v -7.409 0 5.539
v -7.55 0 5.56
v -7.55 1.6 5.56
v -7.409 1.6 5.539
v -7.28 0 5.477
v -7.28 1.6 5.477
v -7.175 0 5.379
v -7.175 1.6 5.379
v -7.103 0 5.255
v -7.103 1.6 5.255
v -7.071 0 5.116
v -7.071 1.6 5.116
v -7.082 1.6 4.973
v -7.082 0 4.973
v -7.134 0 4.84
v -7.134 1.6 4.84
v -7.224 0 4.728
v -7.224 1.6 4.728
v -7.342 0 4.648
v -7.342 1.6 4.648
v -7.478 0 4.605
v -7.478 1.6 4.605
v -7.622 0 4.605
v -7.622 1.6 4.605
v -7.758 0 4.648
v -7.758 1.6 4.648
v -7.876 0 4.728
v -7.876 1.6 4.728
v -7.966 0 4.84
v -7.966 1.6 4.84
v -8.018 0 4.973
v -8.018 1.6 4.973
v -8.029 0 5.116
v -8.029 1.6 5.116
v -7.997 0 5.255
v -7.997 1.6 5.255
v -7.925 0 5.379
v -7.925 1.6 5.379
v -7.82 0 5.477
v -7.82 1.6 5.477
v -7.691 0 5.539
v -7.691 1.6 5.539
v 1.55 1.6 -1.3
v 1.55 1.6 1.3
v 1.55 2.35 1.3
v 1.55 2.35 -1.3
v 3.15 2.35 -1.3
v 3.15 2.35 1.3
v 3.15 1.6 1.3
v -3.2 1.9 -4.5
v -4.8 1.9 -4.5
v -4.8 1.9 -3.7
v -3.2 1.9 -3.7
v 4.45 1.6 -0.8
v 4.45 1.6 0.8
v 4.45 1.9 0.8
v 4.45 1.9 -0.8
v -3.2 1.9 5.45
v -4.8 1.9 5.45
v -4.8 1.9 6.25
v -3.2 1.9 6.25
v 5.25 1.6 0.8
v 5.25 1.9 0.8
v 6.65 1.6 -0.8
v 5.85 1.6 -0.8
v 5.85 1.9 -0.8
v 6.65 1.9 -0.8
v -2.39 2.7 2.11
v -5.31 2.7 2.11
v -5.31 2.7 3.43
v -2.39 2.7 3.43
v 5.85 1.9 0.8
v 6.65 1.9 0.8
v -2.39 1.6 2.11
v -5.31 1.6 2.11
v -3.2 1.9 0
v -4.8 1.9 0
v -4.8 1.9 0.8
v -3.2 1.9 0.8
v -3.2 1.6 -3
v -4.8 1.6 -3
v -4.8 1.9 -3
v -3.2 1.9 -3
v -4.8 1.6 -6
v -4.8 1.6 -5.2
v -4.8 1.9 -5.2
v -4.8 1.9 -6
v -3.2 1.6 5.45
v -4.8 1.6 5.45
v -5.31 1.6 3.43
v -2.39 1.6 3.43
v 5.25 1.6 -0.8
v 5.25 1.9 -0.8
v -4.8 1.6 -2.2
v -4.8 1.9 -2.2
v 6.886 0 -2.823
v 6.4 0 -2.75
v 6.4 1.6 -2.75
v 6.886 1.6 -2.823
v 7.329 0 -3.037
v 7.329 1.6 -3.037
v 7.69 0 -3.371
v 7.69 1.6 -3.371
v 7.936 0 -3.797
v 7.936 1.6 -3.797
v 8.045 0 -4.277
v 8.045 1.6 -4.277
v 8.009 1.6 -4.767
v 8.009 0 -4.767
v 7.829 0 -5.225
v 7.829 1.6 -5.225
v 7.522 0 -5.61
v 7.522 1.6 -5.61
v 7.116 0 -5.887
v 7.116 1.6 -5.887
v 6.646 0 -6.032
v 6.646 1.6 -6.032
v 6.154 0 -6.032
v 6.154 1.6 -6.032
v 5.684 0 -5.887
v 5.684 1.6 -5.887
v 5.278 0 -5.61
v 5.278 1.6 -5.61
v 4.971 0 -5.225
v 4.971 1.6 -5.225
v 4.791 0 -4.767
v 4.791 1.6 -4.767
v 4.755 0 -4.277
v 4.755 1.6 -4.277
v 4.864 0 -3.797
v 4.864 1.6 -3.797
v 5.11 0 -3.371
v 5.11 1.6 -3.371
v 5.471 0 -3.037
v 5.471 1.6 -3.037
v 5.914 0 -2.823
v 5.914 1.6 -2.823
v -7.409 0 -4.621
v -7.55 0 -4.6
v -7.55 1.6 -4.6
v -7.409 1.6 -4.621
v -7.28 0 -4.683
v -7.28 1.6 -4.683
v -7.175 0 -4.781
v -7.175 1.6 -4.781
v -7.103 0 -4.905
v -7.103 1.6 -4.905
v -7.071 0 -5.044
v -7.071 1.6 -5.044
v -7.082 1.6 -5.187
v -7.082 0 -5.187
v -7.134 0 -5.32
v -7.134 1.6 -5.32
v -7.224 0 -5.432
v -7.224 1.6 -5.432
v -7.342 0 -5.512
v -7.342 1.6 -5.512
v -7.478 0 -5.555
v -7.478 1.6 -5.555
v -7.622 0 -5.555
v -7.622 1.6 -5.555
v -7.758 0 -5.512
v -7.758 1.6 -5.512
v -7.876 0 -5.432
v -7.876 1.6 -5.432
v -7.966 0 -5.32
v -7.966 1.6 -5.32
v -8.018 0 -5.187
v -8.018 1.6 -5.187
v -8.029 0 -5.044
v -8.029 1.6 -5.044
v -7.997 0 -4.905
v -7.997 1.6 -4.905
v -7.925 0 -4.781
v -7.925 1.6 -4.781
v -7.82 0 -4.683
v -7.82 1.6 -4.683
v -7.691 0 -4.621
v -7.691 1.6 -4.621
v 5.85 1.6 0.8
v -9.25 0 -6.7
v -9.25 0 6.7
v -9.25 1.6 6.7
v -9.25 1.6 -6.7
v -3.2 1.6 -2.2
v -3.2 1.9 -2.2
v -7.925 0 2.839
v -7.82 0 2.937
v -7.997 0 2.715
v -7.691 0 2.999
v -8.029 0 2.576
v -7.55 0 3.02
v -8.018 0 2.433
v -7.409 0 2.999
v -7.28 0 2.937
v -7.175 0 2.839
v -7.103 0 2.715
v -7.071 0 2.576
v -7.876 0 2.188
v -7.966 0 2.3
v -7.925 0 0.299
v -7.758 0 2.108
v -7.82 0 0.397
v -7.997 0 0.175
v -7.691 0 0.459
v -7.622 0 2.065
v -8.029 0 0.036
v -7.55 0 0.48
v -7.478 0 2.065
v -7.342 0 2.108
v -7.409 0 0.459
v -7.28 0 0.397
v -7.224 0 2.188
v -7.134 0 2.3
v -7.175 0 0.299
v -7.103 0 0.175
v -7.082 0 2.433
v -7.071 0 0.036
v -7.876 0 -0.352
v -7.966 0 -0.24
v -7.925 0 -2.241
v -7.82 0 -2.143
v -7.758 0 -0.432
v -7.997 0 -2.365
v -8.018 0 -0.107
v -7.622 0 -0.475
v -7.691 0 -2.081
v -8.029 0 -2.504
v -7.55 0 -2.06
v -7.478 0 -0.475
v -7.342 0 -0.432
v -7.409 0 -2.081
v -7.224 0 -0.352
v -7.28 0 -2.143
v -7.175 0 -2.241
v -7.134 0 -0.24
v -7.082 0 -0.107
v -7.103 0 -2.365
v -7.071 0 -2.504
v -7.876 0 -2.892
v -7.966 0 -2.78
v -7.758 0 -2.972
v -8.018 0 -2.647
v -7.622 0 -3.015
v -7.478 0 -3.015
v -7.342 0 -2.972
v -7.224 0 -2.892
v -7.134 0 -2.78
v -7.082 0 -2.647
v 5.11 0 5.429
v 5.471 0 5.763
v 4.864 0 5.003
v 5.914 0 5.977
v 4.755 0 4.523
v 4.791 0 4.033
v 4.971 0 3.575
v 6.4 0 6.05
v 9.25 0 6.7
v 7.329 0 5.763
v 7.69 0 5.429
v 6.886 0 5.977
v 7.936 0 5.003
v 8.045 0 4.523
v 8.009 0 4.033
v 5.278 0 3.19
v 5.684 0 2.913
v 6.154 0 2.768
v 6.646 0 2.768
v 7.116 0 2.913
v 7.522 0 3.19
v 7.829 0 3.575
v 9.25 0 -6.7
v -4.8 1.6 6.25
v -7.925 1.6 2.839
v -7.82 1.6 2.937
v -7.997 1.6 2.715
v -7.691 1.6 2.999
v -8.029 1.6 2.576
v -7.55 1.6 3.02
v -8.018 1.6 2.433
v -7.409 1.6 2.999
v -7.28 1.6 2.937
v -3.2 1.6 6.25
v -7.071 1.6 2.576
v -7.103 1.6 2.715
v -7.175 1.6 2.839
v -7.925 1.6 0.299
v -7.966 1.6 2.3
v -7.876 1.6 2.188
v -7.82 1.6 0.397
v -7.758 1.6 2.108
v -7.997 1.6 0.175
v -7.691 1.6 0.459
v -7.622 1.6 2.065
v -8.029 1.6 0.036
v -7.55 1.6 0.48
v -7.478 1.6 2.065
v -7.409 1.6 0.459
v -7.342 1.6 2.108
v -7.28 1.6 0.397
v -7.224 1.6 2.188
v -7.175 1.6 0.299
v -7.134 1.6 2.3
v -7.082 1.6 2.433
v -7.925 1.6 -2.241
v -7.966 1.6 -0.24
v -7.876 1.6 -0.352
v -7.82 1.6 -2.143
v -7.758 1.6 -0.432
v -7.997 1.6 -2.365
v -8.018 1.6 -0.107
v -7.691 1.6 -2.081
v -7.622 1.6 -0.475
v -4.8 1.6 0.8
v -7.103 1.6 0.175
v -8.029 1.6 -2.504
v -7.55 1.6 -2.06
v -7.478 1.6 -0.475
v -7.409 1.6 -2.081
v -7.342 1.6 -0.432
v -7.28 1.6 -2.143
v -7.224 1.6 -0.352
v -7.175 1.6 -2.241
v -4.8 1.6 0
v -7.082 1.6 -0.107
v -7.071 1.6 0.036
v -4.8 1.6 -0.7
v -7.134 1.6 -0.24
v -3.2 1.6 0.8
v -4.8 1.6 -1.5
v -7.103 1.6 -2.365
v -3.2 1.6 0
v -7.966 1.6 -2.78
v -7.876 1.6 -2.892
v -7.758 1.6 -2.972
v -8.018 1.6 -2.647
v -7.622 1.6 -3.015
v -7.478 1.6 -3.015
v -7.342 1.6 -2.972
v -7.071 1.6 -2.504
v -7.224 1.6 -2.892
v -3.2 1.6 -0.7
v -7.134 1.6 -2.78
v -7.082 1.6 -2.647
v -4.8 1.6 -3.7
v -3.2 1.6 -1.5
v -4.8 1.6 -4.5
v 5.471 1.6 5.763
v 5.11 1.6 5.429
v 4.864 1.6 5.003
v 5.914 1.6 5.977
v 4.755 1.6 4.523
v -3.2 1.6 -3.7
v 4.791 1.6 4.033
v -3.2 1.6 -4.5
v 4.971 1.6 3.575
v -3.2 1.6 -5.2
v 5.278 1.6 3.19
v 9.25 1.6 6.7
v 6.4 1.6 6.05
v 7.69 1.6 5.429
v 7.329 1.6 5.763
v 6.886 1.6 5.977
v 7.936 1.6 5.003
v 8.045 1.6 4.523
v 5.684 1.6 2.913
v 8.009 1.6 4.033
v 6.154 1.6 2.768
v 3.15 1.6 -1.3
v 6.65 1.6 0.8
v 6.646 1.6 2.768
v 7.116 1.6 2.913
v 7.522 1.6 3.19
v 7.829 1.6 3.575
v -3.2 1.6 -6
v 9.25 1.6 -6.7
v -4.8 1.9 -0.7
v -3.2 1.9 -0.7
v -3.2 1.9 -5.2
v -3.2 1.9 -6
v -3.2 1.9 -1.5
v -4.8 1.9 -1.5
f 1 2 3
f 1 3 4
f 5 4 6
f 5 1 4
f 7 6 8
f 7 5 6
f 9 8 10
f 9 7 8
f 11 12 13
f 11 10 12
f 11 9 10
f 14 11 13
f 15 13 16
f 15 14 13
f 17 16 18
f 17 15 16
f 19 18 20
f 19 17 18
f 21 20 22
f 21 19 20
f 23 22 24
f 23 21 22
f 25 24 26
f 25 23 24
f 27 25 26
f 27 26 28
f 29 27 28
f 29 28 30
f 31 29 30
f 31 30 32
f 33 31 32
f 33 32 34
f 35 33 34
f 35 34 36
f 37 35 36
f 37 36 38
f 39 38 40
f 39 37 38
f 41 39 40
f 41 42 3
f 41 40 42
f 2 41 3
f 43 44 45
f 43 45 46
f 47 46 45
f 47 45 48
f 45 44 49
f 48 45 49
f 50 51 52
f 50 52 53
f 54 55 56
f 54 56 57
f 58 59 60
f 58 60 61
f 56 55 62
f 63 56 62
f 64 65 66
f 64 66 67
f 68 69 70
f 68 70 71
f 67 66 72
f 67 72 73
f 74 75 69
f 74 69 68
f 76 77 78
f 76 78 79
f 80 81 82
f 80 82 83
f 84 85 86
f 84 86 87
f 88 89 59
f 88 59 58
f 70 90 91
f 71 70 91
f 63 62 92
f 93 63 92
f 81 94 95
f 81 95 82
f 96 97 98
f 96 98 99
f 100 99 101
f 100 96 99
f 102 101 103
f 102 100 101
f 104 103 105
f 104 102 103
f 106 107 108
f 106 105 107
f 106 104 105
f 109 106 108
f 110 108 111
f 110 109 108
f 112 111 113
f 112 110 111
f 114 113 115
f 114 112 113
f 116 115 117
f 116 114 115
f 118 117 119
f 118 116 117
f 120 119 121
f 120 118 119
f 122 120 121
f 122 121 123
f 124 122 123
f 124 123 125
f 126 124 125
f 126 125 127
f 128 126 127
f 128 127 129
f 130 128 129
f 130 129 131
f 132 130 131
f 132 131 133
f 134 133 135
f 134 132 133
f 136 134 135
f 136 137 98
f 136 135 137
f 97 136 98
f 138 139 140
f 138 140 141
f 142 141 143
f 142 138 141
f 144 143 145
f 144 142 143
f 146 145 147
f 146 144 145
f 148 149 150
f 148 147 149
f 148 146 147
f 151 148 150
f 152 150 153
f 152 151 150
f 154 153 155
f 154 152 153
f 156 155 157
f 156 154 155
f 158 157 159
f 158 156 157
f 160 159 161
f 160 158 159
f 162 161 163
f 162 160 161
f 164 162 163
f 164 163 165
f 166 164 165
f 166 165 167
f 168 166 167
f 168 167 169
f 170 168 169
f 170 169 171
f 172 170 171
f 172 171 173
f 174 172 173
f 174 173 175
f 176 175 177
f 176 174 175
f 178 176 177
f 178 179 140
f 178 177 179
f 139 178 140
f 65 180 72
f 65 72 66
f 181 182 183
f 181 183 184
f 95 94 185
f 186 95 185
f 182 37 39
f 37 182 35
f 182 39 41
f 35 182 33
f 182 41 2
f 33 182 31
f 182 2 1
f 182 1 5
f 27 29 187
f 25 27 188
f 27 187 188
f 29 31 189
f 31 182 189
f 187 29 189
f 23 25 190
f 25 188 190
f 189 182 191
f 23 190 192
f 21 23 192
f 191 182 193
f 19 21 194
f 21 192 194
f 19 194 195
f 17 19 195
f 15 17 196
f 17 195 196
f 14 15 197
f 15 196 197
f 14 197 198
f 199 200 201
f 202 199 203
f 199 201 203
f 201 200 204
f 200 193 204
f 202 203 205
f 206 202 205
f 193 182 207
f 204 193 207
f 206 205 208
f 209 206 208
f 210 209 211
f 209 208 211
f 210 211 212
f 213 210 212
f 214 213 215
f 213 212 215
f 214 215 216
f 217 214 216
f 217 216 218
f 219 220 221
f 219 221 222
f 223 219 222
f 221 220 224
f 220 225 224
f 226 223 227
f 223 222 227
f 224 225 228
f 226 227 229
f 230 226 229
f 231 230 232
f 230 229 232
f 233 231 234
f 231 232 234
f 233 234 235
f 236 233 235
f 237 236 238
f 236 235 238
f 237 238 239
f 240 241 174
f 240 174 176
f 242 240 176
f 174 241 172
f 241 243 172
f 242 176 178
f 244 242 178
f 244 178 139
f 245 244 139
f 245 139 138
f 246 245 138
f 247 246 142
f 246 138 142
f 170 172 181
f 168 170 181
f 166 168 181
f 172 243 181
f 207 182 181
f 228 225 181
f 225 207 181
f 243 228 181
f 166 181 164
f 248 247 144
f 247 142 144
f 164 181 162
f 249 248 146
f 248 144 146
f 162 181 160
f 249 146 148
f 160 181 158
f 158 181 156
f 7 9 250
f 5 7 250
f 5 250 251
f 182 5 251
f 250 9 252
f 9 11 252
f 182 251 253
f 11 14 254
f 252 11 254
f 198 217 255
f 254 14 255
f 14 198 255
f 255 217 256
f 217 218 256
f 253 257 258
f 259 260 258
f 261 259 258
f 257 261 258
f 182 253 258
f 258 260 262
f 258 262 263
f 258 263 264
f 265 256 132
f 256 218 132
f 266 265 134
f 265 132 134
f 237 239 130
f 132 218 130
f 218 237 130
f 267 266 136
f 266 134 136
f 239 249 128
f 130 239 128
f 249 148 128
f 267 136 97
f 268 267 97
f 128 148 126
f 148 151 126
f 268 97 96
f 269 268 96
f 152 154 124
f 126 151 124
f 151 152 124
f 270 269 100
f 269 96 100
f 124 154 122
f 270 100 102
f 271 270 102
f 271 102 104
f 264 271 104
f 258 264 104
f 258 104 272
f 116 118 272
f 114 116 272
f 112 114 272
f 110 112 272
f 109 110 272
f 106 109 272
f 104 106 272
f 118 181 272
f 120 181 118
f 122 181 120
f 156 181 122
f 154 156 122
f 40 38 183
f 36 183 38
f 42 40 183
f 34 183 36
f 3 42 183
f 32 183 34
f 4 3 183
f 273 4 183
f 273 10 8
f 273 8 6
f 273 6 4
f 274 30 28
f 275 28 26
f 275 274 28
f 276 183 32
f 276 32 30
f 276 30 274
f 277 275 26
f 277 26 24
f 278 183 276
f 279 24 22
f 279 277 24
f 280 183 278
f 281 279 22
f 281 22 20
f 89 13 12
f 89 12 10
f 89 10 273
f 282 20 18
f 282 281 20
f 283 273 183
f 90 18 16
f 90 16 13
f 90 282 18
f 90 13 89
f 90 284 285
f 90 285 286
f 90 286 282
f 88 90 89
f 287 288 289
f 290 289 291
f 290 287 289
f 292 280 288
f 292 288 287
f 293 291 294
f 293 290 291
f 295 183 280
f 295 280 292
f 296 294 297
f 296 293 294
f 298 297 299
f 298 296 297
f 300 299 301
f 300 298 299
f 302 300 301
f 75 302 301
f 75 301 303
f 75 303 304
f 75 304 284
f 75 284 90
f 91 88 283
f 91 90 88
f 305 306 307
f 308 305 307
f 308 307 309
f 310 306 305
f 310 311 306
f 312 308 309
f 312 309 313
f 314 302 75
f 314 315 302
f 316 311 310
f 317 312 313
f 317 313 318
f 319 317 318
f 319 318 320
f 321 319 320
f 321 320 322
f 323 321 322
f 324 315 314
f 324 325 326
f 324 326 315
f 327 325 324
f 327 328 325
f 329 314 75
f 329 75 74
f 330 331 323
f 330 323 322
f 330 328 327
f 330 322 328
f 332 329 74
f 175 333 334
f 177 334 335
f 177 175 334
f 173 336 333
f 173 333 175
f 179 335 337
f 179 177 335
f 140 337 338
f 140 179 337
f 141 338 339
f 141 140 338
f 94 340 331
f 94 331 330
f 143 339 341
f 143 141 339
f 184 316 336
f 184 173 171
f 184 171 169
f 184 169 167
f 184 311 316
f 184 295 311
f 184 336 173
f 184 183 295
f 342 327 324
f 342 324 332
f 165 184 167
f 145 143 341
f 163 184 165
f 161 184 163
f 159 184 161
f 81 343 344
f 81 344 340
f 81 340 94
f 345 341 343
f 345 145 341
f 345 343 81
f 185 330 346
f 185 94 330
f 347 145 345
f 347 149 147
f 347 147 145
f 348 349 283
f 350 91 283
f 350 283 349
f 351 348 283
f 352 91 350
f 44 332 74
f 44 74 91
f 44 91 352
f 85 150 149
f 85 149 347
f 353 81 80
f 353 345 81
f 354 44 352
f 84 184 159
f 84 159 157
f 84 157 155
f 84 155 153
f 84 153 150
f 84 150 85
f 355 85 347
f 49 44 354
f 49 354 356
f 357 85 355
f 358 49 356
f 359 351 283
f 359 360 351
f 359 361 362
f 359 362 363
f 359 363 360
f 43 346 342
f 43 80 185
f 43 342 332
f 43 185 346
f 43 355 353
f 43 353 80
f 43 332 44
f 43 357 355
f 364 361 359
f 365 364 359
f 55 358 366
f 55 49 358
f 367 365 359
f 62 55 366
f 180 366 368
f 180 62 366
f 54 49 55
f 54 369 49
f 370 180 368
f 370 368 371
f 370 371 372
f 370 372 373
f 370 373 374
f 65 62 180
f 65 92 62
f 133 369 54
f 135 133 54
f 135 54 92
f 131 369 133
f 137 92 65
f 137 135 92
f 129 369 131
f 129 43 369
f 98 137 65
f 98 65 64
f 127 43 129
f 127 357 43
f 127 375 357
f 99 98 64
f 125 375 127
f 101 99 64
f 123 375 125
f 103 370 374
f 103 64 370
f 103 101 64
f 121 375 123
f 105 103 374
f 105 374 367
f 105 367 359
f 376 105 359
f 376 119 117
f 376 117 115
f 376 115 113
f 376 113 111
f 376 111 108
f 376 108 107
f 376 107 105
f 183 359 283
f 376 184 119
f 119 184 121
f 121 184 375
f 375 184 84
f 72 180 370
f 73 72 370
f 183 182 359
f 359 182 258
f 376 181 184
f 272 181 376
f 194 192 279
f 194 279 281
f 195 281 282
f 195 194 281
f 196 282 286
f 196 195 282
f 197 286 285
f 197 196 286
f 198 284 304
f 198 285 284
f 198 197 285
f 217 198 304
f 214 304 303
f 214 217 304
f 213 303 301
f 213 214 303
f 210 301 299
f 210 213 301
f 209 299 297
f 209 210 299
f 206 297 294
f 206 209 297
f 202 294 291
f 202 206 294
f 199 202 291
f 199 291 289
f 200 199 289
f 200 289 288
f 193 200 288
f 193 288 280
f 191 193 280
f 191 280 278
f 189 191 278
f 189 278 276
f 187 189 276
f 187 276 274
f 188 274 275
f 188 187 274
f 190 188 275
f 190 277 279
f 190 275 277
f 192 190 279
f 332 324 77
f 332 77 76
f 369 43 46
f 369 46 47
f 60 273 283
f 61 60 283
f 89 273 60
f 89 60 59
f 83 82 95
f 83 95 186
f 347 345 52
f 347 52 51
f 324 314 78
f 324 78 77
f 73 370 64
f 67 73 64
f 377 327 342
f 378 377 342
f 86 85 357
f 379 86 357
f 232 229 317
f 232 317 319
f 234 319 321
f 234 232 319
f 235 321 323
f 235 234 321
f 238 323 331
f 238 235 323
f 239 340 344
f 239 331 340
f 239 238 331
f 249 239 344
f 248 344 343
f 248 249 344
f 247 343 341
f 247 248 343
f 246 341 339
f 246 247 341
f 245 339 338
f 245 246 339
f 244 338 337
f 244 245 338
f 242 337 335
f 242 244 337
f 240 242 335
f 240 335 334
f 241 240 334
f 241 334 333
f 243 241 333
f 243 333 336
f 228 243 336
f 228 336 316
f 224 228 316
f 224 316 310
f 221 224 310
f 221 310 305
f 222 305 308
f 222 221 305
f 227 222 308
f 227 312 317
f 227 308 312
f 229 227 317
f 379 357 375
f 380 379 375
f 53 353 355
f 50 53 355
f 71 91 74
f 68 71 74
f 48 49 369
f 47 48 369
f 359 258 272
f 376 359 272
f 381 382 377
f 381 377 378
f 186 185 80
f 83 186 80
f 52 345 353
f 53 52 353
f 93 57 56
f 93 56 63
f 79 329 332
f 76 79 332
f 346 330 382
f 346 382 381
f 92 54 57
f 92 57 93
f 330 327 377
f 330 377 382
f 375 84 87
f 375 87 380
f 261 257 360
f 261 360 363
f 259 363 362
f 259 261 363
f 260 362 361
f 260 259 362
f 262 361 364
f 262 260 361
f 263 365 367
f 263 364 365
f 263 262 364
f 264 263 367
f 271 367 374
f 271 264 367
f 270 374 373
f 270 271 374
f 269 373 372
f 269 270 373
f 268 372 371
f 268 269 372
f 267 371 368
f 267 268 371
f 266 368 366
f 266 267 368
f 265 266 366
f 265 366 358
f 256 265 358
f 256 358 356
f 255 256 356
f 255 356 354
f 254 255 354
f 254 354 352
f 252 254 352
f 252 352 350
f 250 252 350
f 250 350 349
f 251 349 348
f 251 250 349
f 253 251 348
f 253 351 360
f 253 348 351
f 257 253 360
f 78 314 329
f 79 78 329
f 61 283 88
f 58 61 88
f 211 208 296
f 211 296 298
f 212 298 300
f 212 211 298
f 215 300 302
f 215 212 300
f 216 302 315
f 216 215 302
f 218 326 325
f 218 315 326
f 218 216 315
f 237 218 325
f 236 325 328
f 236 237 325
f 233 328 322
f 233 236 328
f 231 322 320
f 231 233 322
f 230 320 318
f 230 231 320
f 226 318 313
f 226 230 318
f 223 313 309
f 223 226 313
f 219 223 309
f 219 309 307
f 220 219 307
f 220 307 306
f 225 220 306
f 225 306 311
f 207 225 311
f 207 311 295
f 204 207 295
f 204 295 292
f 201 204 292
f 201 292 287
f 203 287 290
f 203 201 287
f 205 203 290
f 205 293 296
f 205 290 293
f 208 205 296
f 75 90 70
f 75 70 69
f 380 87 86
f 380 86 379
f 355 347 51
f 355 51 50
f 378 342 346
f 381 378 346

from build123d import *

# Parameters (mm, degrees)
SKETCH2_W               = 18.5
SKETCH2_H               = 13.4
BOSS_EXTRUDE1_DEPTH     = 1.6
CUT_EXTRUDE1_DEPTH      = 12.533104526
CUT_EXTRUDE1_DEPTH_BACK = 12.533104526
SKETCH3_R               = 0.48
SKETCH3_R_2             = 1.65
SKETCH6_W               = 1.6
SKETCH6_H               = 0.8
SKETCH6_W_2             = 0.8
SKETCH6_H_2             = 1.6
BOSS_EXTRUDE2_DEPTH     = 0.3
SKETCH7_W               = 2.92
SKETCH7_H               = 1.32
BOSS_EXTRUDE3_DEPTH     = 1.1
SKETCH8_W               = 1.6
SKETCH8_H               = 2.6
BOSS_EXTRUDE4_DEPTH     = 0.75


with BuildPart() as part:
    # Sketch2 → Boss-Extrude1 (new body)
    with BuildSketch(Plane(origin=(0, 0, 0), x_dir=(1, 0, 0), z_dir=(0, 1, 0))):
        Rectangle(SKETCH2_W, SKETCH2_H)
    extrude(amount=BOSS_EXTRUDE1_DEPTH)

    # Sketch3 → Cut-Extrude1 (cut, two sides: drawn at the far end of the back side and taken through both)
    with BuildSketch(Plane(origin=(0, 1.6, 0), x_dir=(1, 0, 0), z_dir=(0, 1, 0)).offset(-CUT_EXTRUDE1_DEPTH_BACK)):
        with Locations(Location((-7.55, 5.08, 0), (0, 0, 270))):
            Circle(SKETCH3_R)
        with Locations(Location((-7.55, 2.54, 0), (0, 0, 270))):
            Circle(SKETCH3_R)
        with Locations(Location((-7.55, 0, 0), (0, 0, 270))):
            Circle(SKETCH3_R)
        with Locations(Location((-7.55, -2.54, 0), (0, 0, 270))):
            Circle(SKETCH3_R)
        with Locations(Location((-7.55, -5.08, 0), (0, 0, 270))):
            Circle(SKETCH3_R)
        with Locations(Location((6.4, 4.4, 0), (0, 0, 270))):
            Circle(SKETCH3_R_2)
        with Locations(Location((6.4, -4.4, 0), (0, 0, 270))):
            Circle(SKETCH3_R_2)
    extrude(amount=CUT_EXTRUDE1_DEPTH + CUT_EXTRUDE1_DEPTH_BACK, mode=Mode.SUBTRACT)

    # Sketch6 → Boss-Extrude2 (add)
    with BuildSketch(Plane(origin=(0, 1.6, 0), x_dir=(1, 0, 0), z_dir=(0, 1, 0))):
        with Locations((-4, 5.6)):
            Rectangle(SKETCH6_W, SKETCH6_H)
        with Locations((-4, 4.1)):
            Rectangle(SKETCH6_W, SKETCH6_H)
        with Locations((-4, 2.6)):
            Rectangle(SKETCH6_W, SKETCH6_H)
        with Locations((-4, 1.1)):
            Rectangle(SKETCH6_W, SKETCH6_H)
        with Locations((-4, -0.4)):
            Rectangle(SKETCH6_W, SKETCH6_H)
        with Locations((-4, -5.85)):
            Rectangle(SKETCH6_W, SKETCH6_H)
        with Locations((6.25, 0)):
            Rectangle(SKETCH6_W_2, SKETCH6_H_2)
        with Locations((4.85, 0)):
            Rectangle(SKETCH6_W_2, SKETCH6_H_2)
    extrude(amount=BOSS_EXTRUDE2_DEPTH)

    # Sketch7 → Boss-Extrude3 (add)
    with BuildSketch(Plane(origin=(0, 1.6, 0), x_dir=(1, 0, 0), z_dir=(0, 1, 0))):
        with Locations((-3.85, -2.77)):
            Rectangle(SKETCH7_W, SKETCH7_H)
    extrude(amount=BOSS_EXTRUDE3_DEPTH)

    # Sketch8 → Boss-Extrude4 (add)
    with BuildSketch(Plane(origin=(0, 1.6, 0), x_dir=(1, 0, 0), z_dir=(0, 1, 0))):
        with Locations((2.35, 0)):
            Rectangle(SKETCH8_W, SKETCH8_H)
    extrude(amount=BOSS_EXTRUDE4_DEPTH)


solid = part.part
